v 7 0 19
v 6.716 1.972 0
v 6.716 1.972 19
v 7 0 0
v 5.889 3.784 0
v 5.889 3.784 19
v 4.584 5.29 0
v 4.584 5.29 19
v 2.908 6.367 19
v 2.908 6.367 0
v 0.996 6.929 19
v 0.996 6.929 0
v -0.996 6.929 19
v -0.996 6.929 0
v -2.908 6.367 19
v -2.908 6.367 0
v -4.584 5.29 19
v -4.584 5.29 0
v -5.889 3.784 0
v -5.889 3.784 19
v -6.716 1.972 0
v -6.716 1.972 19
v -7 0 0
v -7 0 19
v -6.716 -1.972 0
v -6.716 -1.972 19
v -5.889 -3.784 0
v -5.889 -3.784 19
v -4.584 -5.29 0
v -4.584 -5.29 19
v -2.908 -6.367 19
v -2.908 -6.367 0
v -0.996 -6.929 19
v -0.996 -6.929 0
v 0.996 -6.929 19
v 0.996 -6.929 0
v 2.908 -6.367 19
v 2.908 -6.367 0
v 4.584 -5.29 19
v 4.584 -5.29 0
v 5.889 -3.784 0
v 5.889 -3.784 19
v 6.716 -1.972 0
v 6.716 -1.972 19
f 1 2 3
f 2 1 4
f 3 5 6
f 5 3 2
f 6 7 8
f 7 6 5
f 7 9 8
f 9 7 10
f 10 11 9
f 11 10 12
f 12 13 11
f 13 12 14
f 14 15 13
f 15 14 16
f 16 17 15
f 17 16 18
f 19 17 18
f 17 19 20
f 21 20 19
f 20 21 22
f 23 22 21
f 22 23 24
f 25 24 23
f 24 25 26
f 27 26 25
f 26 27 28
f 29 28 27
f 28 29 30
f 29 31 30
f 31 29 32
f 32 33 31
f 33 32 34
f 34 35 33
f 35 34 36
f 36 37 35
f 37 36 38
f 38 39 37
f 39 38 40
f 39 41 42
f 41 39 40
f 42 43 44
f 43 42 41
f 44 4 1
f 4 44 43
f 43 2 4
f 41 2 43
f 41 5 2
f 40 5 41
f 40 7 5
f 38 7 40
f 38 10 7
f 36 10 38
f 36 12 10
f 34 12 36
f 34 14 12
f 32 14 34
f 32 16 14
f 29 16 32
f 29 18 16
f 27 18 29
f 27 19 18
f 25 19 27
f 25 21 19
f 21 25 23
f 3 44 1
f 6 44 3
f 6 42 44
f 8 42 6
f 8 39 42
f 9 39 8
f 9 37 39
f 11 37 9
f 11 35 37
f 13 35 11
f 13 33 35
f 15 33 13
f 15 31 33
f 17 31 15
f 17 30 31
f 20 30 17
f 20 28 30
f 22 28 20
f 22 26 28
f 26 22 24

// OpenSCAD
// Generated by SolidPython 1.0.1 on 2020-07-29 00:46:45


cylinder(h = 19, r1 = 7, r2 = 7);
/***********************************************
*********      SolidPython code:      **********
************************************************
 
# import packages: SolidPython
from solid import *
from solid.utils import *
from itertools import chain, combinations, permutations


class Resize:

    def __init__(self, scad_file):
        self.scad_file = scad_file
        #self.scad_file = import_scad(scad_file)
        # cone/cylinder param:
        self.r1 = 0
        self.r2 = 0
        self.h = 0
        # rectangular prism param:
        self.w = 0
        self.l = 0
        # ellipse param:
        self.r = 0

    # import OpenScad code (file name corresponds to shape)


    # classify shape + parameters
    def assign(self, param1, param2, param3):
        if self.scad_file == 'cone.scad':
            self.r1 = param1
            self.r2 = param2
            self.h = param3
        elif self.scad_file == 'cylinder.scad':
            self.r1 = param1
            self.r2 = param2
            self.h = param3
        elif self.scad_file == 'rectangularPrism.scad':
            self.h = param1
            self.l = param2
            self.w = param3
        else:
            self.r = param1
            self.h = param2

    # resize parameters
    def iterate(self):
        x = range(3, 20, 2)
        i = 1
        if self.scad_file == 'cone.scad':
            tempList = list(permutations(x, 2))
            for temp in tempList:
                param1 = temp[0]
                param2 = temp[1]
                filepath = 'produced_scad_files/' + 'cone' + str(param1) + '_' + str(param2) + '_' + '.scad'
                scad_render_to_file(cylinder(h=param1, r1=param2, r2=0), filepath)

        elif self.scad_file == 'cylinder.scad':
            tempList = list(permutations(x, 3))
            for temp in tempList:
                param1 = temp[0]
                param2 = temp[1]
                filepath = 'produced_scad_files/' + 'cylinder' + str(param1) + '_' + str(param2) + '_' + '.scad'
                scad_render_to_file(cylinder(h=param1, r1=param2, r2=param2), filepath)

        elif self.scad_file == 'rectangularPrism.scad':
            tempList = list(permutations(x, 3))
            for temp in tempList:
                param1 = temp[0]
                param2 = temp[1]
                param3 = temp[2]
                filepath = 'produced_scad_files/' + 'rectangularPrism' + str(param1) + '_' + str(param2) + '_' + str(
                    param3) + '.scad'
                scad_render_to_file(cube(size=(param1, param2, param3)), filepath)

        elif self.scad_file == 'ellipse.scad':
            tempList = list(permutations(x, 4))
            for temp in tempList:
                param1 = temp[0]
                param2 = temp[1]
                param3 = temp[2]
                param4 = temp[3]
                filepath = 'produced_scad_files/' + 'ellipse' + str(param1) + '_' + str(param2) + '_' + str(param3) + '_' + str(param4) + '.scad'
                scad_render_to_file(scale([param1, param2, param3])(sphere(r=param4)), filepath)

    def render_to_scadfile(self):
        scad_render_to_file(scad, 'example.scad') 
 
************************************************/
